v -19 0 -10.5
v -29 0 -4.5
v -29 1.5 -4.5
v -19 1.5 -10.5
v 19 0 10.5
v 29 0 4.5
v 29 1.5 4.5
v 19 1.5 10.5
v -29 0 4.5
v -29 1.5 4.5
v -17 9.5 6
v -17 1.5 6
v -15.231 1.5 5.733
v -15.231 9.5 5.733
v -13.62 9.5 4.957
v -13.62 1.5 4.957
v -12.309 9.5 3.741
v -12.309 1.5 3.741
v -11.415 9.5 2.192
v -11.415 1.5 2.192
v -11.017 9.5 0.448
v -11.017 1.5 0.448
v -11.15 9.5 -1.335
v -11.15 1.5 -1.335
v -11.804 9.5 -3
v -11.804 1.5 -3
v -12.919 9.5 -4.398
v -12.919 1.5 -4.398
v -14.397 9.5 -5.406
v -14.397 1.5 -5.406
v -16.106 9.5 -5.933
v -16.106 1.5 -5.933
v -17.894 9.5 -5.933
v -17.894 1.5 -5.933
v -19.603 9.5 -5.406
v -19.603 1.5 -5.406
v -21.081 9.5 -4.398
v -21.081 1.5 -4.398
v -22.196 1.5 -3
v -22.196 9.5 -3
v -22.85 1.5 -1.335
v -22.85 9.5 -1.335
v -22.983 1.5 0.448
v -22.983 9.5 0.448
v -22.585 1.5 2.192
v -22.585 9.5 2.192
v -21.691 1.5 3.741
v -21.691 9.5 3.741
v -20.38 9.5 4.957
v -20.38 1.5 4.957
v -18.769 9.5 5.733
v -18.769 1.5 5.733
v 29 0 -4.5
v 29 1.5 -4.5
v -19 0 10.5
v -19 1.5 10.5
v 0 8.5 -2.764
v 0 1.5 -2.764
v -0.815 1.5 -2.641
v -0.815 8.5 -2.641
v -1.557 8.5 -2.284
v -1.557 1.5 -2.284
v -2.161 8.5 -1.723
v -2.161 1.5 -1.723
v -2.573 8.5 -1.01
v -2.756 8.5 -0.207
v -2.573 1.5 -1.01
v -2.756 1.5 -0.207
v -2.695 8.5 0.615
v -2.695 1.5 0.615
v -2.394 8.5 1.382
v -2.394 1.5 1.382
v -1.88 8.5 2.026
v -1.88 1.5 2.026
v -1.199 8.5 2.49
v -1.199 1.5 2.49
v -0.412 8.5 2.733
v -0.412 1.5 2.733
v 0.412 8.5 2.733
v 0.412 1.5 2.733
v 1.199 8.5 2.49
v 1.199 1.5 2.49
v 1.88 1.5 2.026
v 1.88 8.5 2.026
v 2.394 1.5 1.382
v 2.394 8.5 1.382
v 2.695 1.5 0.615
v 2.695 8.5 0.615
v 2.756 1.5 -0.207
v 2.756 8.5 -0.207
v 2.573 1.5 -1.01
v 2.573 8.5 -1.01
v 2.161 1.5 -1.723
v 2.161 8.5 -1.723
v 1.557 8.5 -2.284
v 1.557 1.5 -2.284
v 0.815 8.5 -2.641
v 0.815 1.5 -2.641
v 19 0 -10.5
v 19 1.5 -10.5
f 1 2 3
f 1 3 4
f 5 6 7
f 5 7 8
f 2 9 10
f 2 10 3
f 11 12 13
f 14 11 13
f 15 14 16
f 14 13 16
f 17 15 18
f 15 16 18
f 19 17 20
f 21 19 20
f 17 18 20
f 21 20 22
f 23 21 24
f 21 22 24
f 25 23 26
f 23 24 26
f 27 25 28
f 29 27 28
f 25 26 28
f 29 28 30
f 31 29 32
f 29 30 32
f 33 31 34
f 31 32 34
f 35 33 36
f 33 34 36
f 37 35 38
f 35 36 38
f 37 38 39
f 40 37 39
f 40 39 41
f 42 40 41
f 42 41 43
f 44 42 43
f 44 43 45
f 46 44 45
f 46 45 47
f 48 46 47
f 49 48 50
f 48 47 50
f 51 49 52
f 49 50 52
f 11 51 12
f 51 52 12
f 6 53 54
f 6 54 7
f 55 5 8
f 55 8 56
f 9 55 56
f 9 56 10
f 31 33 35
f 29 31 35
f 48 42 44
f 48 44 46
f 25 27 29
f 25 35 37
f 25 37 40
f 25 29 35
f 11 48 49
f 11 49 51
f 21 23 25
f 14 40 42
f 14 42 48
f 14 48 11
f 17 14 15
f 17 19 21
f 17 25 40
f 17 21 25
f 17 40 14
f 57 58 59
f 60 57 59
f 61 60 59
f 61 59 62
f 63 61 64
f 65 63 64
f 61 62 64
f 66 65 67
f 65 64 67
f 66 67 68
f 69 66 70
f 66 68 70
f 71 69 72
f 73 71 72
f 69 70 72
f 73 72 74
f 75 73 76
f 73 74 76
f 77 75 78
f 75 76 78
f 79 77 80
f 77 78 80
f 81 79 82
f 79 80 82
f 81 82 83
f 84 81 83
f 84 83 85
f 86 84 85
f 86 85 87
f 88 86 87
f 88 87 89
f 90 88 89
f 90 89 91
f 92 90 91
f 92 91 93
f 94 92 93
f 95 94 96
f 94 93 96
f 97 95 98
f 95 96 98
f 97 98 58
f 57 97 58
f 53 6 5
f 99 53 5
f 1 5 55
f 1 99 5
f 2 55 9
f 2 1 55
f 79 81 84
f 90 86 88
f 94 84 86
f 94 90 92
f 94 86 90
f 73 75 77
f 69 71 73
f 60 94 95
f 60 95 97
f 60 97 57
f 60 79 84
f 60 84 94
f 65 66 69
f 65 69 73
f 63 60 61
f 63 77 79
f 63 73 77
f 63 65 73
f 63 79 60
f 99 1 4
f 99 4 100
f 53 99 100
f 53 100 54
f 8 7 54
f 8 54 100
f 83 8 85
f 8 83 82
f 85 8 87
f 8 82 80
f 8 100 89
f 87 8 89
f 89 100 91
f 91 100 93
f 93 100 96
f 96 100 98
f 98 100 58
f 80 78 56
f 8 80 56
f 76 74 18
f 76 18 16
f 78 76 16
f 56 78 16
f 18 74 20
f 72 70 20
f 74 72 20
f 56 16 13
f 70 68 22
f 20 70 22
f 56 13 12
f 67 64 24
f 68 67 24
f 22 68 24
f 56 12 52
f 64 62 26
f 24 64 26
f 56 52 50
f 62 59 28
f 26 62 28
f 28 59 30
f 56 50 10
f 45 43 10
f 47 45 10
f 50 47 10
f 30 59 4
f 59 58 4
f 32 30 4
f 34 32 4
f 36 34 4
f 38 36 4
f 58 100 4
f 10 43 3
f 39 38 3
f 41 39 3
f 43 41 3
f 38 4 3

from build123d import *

# Parameters (mm, degrees)
BOSS_EXTRUDE1_DEPTH = 1.5
SKETCH2_R           = 6
BOSS_EXTRUDE2_DEPTH = 8
SKETCH3_R           = 2.764055342
BOSS_EXTRUDE3_DEPTH = 7


with BuildPart() as part:
    # Sketch1 → Boss-Extrude1 (new body)
    with BuildSketch(Plane(origin=(0, 0, 0), x_dir=(1, 0, 0), z_dir=(0, 1, 0))):
        Polygon((-19, 10.5), (19, 10.5), (29, 4.5), (29, -4.5), (19, -10.5), (-19, -10.5), (-29, -4.5), (-29, 4.5), align=None)
    extrude(amount=BOSS_EXTRUDE1_DEPTH)

    # Sketch2 → Boss-Extrude2 (add)
    with BuildSketch(Plane(origin=(0, 1.5, 0), x_dir=(1, 0, 0), z_dir=(0, 1, 0))):
        with Locations(Location((-17, 0, 0), (0, 0, 270))):
            Circle(SKETCH2_R)
    extrude(amount=BOSS_EXTRUDE2_DEPTH)

    # Sketch3 → Boss-Extrude3 (add)
    with BuildSketch(Plane(origin=(0, 1.5, 0), x_dir=(1, 0, 0), z_dir=(0, 1, 0))):
        with Locations(Location((0, 0, 0), (0, 0, 90))):
            Circle(SKETCH3_R)
    extrude(amount=BOSS_EXTRUDE3_DEPTH)


solid = part.part
